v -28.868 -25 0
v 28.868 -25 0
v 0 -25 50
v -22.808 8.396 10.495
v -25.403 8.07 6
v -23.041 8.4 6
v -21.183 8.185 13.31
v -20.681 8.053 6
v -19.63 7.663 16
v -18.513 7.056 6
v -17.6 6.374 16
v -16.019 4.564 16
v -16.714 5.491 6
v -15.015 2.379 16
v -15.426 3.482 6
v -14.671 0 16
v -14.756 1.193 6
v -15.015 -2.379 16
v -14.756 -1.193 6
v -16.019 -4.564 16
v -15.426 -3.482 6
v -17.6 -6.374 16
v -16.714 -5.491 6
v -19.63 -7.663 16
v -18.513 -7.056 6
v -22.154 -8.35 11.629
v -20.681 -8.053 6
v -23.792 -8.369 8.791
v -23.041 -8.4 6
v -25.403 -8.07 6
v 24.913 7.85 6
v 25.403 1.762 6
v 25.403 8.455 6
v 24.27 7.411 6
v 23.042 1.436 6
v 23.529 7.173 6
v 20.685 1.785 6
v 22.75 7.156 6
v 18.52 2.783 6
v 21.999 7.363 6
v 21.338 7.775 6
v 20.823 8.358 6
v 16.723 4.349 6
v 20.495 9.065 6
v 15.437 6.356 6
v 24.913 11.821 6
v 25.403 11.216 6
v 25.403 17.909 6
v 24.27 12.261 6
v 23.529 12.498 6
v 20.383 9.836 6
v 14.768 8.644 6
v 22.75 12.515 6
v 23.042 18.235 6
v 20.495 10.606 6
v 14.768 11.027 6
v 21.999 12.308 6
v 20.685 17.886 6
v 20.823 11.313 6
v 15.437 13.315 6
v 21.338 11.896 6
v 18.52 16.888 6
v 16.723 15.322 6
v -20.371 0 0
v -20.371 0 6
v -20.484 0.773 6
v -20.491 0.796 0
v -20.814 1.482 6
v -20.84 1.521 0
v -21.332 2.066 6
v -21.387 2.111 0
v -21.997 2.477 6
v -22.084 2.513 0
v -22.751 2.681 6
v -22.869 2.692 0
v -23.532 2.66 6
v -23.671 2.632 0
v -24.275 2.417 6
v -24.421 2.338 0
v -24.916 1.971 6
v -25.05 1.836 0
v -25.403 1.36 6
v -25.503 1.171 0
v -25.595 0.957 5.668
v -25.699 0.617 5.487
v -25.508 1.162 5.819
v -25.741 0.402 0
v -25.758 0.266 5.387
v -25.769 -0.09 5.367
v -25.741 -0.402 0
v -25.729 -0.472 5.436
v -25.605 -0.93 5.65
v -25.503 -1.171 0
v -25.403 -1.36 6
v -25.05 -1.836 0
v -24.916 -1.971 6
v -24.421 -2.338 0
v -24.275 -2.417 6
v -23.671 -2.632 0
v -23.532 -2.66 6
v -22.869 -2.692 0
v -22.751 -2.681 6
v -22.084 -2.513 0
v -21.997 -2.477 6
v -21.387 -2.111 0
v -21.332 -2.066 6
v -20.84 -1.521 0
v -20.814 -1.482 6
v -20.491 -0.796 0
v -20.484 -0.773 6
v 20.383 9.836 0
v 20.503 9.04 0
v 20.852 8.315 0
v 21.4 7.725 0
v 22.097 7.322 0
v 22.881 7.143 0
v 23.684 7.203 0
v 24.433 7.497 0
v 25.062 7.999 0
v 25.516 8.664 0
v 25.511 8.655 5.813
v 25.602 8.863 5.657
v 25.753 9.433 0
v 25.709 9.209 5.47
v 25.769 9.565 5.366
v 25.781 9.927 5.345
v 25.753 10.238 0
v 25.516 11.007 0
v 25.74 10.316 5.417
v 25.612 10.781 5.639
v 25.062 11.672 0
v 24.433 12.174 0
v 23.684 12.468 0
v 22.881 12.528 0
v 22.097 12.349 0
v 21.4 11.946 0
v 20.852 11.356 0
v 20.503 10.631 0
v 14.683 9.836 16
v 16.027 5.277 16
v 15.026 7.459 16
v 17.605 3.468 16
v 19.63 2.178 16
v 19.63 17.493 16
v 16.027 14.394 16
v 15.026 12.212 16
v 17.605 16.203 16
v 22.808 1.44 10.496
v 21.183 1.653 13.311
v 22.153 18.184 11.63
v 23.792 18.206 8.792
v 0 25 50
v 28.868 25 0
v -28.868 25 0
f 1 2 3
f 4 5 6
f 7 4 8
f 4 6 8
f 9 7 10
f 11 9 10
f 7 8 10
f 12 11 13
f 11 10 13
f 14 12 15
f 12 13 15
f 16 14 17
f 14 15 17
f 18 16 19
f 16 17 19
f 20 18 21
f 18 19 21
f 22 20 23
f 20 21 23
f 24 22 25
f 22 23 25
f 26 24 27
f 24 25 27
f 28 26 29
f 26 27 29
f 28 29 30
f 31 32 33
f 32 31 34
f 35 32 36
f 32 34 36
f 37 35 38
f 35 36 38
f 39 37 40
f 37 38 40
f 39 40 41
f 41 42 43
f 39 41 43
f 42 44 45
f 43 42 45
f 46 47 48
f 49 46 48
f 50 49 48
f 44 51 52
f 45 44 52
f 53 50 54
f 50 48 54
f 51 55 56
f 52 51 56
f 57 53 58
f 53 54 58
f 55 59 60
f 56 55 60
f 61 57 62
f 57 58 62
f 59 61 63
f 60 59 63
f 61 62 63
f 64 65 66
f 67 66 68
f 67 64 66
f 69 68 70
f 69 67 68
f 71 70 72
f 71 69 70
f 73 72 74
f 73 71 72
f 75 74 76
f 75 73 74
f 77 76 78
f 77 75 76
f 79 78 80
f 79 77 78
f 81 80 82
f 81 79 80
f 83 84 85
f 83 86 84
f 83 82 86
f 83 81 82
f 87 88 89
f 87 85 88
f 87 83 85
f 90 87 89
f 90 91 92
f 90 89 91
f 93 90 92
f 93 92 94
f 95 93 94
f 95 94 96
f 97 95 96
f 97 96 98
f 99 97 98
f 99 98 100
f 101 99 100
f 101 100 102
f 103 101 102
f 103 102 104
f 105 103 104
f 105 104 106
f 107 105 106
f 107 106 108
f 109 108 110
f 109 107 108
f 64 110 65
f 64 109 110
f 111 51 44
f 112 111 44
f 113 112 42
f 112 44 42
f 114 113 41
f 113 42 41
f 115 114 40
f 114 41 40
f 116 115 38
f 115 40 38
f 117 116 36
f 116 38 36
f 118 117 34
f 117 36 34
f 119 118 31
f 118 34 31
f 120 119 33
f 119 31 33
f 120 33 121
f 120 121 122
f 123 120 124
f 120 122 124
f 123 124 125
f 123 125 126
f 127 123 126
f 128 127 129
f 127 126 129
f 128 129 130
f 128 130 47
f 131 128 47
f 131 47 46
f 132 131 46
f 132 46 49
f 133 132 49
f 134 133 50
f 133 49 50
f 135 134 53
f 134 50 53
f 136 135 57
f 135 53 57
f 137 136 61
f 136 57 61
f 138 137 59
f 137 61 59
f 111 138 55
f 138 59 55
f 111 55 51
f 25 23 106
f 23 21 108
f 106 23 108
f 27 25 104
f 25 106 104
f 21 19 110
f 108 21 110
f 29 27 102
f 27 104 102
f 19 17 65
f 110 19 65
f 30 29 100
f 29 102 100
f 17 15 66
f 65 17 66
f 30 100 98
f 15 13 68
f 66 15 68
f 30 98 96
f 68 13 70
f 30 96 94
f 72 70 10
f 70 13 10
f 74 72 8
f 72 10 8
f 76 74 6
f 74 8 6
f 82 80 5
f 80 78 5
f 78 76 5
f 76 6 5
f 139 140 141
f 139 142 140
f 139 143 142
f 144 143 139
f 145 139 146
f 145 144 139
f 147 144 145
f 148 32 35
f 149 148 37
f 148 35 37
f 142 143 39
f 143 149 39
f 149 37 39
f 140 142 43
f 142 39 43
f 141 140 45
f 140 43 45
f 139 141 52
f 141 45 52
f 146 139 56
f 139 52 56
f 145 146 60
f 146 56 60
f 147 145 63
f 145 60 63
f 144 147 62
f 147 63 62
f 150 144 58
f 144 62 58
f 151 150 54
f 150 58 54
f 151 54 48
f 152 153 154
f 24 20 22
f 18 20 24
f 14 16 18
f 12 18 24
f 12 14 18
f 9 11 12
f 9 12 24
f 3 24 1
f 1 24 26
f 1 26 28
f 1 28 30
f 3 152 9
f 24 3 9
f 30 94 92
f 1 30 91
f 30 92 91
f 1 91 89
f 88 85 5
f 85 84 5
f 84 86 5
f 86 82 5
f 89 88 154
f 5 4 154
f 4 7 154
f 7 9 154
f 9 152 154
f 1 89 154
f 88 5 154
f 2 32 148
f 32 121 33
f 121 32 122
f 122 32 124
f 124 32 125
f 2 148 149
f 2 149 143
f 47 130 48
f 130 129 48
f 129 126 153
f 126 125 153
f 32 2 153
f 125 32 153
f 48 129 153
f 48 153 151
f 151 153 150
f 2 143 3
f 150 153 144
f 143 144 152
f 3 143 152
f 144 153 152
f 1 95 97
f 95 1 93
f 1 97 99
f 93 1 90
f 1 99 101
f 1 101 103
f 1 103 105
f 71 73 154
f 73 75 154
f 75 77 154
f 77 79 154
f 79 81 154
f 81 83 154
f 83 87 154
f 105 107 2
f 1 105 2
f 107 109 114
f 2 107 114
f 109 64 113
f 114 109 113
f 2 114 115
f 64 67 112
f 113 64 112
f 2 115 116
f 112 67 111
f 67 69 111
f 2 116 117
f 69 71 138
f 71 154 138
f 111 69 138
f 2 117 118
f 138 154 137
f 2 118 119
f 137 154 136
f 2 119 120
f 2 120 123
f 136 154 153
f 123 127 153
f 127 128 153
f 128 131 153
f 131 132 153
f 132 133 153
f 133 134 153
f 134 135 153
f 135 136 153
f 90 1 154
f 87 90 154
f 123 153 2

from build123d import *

# Parameters (mm, degrees)
SALIENTE_EXTRUIR1_DEPTH = 25
CROQUIS6_R              = 2.7
CORTAR_EXTRUIR1_DEPTH   = 15
CROQUIS7_R              = 8.4
CORTAR_EXTRUIR2_DEPTH   = 10


with BuildPart() as part:
    # Croquis1 → Saliente-Extruir1 (new, symmetric)
    with BuildSketch(Plane(origin=(0, 0, 0), x_dir=(1, 0, 0), z_dir=(0, 1, 0))):
        Polygon((-28.867513459, 0), (28.867513459, 0), (0, -50), align=None)
    extrude(amount=SALIENTE_EXTRUIR1_DEPTH, both=True)

    # Croquis6 → Cortar-Extruir1 (cut, symmetric)
    with BuildSketch(Plane.XY):
        with Locations((-23.070667369, 0)):
            Circle(CROQUIS6_R)
        with Locations(Location((23.082974371, 9.835520027, 0), (0, 0, 180))):
            Circle(CROQUIS6_R)
    extrude(amount=CORTAR_EXTRUIR1_DEPTH, both=True, mode=Mode.SUBTRACT)

    # Croquis7 → Cortar-Extruir2 (cut)
    with BuildSketch(Plane(origin=(0, 0, 6), x_dir=(-1, 0, 0), z_dir=(0, 0, -1))):
        with Locations((-23.082974371, 9.835520027)):
            Circle(CROQUIS7_R)
        with Locations((23.070667369, 0)):
            Circle(CROQUIS7_R)
    extrude(amount=-CORTAR_EXTRUIR2_DEPTH, mode=Mode.SUBTRACT)


solid = part.part
